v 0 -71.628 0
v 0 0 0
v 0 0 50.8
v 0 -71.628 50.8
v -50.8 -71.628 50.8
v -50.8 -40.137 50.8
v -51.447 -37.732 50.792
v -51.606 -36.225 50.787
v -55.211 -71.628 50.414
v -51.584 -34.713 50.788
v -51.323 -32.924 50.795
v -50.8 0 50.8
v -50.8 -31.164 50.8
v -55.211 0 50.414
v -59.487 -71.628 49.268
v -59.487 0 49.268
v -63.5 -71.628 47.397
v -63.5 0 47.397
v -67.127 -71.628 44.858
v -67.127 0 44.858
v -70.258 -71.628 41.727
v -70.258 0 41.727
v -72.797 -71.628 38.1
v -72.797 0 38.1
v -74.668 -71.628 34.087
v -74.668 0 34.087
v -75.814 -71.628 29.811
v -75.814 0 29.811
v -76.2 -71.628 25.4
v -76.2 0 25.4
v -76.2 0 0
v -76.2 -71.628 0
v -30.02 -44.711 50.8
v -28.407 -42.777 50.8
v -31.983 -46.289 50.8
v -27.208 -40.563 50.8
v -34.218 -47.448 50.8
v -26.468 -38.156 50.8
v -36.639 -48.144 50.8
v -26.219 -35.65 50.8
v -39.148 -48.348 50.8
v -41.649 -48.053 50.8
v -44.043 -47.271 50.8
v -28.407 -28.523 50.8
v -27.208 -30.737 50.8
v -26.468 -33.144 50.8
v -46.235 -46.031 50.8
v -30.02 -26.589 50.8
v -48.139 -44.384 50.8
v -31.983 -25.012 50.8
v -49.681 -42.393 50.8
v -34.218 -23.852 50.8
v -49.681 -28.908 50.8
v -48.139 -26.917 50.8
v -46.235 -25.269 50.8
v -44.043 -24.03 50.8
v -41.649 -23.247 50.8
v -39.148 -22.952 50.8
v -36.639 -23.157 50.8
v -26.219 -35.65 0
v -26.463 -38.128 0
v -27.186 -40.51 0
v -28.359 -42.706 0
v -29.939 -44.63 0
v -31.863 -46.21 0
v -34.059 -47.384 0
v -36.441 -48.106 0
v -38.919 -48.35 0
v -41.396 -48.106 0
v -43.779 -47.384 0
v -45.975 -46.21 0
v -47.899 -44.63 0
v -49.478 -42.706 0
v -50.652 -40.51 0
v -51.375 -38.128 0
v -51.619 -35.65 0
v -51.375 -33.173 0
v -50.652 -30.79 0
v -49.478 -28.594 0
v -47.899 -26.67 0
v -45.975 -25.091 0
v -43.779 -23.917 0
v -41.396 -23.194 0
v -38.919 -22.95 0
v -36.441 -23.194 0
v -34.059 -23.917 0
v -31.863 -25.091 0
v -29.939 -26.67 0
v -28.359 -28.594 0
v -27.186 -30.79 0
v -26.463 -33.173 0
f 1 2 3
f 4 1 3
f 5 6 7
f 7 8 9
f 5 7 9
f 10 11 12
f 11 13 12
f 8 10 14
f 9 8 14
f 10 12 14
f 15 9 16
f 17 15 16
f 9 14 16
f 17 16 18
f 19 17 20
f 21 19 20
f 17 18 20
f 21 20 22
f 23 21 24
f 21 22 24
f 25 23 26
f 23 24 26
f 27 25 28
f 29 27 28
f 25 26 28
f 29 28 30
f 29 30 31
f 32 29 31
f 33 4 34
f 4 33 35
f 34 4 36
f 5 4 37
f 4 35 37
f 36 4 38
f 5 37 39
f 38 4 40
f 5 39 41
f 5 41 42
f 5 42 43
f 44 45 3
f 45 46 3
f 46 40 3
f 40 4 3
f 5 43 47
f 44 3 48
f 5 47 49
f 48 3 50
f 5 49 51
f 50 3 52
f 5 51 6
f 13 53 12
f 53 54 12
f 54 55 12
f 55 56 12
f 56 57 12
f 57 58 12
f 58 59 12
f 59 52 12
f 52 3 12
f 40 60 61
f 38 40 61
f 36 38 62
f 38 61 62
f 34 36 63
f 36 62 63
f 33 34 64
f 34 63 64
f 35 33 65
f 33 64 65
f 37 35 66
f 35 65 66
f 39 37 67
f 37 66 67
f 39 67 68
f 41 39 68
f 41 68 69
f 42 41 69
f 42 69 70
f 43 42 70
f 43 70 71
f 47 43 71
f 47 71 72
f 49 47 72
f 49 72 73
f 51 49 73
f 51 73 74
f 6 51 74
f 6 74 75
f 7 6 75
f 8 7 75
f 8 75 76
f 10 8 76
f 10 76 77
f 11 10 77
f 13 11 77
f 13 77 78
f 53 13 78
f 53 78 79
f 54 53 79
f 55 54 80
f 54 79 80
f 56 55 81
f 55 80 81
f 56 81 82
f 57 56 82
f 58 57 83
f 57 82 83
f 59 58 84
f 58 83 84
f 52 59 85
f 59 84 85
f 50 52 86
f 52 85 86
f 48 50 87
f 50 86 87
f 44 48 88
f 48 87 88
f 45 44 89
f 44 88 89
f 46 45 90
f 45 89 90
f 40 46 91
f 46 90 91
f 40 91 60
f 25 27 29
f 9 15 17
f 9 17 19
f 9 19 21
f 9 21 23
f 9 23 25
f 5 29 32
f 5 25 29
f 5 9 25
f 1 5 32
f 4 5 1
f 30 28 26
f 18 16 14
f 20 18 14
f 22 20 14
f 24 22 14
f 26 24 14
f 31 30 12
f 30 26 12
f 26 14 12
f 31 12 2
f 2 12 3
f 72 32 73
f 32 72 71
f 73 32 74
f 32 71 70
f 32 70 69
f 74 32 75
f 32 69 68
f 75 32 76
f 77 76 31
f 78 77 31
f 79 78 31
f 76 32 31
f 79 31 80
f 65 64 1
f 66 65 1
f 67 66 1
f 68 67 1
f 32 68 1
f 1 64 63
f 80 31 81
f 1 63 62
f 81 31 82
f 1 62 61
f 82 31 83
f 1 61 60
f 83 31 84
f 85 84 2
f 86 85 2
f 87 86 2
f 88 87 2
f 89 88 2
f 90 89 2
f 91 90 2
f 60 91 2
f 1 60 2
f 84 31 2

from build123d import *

# Parameters (mm, degrees)
F1_DEPTH = 71.628
F2_R     = 12.7
F3_DEPTH = 50.801


with BuildPart() as f1:
    # F0 (on Front) → F1 (new body)
    with BuildSketch(Plane.XZ):
        with BuildLine():
            Line((-76.2, 0), (0, 0))
            Line((0, 0), (0, 50.8))
            Line((0, 50.8), (-50.8, 50.8))
            ThreePointArc((-50.8, 50.8), (-68.760512, 43.360512), (-76.2, 25.4))
            Line((-76.2, 25.4), (-76.2, 0))
        make_face()
    extrude(amount=F1_DEPTH)

    # F2 (on face) → F3 (cut, through all)
    with BuildSketch(Plane(origin=(0, 0, 0), x_dir=(1, 0, 0), z_dir=(0, 0, -1))):
        with Locations((-38.918827, 35.650235)):
            Circle(F2_R)
    extrude(amount=-F3_DEPTH, mode=Mode.SUBTRACT)


solid = f1.part
